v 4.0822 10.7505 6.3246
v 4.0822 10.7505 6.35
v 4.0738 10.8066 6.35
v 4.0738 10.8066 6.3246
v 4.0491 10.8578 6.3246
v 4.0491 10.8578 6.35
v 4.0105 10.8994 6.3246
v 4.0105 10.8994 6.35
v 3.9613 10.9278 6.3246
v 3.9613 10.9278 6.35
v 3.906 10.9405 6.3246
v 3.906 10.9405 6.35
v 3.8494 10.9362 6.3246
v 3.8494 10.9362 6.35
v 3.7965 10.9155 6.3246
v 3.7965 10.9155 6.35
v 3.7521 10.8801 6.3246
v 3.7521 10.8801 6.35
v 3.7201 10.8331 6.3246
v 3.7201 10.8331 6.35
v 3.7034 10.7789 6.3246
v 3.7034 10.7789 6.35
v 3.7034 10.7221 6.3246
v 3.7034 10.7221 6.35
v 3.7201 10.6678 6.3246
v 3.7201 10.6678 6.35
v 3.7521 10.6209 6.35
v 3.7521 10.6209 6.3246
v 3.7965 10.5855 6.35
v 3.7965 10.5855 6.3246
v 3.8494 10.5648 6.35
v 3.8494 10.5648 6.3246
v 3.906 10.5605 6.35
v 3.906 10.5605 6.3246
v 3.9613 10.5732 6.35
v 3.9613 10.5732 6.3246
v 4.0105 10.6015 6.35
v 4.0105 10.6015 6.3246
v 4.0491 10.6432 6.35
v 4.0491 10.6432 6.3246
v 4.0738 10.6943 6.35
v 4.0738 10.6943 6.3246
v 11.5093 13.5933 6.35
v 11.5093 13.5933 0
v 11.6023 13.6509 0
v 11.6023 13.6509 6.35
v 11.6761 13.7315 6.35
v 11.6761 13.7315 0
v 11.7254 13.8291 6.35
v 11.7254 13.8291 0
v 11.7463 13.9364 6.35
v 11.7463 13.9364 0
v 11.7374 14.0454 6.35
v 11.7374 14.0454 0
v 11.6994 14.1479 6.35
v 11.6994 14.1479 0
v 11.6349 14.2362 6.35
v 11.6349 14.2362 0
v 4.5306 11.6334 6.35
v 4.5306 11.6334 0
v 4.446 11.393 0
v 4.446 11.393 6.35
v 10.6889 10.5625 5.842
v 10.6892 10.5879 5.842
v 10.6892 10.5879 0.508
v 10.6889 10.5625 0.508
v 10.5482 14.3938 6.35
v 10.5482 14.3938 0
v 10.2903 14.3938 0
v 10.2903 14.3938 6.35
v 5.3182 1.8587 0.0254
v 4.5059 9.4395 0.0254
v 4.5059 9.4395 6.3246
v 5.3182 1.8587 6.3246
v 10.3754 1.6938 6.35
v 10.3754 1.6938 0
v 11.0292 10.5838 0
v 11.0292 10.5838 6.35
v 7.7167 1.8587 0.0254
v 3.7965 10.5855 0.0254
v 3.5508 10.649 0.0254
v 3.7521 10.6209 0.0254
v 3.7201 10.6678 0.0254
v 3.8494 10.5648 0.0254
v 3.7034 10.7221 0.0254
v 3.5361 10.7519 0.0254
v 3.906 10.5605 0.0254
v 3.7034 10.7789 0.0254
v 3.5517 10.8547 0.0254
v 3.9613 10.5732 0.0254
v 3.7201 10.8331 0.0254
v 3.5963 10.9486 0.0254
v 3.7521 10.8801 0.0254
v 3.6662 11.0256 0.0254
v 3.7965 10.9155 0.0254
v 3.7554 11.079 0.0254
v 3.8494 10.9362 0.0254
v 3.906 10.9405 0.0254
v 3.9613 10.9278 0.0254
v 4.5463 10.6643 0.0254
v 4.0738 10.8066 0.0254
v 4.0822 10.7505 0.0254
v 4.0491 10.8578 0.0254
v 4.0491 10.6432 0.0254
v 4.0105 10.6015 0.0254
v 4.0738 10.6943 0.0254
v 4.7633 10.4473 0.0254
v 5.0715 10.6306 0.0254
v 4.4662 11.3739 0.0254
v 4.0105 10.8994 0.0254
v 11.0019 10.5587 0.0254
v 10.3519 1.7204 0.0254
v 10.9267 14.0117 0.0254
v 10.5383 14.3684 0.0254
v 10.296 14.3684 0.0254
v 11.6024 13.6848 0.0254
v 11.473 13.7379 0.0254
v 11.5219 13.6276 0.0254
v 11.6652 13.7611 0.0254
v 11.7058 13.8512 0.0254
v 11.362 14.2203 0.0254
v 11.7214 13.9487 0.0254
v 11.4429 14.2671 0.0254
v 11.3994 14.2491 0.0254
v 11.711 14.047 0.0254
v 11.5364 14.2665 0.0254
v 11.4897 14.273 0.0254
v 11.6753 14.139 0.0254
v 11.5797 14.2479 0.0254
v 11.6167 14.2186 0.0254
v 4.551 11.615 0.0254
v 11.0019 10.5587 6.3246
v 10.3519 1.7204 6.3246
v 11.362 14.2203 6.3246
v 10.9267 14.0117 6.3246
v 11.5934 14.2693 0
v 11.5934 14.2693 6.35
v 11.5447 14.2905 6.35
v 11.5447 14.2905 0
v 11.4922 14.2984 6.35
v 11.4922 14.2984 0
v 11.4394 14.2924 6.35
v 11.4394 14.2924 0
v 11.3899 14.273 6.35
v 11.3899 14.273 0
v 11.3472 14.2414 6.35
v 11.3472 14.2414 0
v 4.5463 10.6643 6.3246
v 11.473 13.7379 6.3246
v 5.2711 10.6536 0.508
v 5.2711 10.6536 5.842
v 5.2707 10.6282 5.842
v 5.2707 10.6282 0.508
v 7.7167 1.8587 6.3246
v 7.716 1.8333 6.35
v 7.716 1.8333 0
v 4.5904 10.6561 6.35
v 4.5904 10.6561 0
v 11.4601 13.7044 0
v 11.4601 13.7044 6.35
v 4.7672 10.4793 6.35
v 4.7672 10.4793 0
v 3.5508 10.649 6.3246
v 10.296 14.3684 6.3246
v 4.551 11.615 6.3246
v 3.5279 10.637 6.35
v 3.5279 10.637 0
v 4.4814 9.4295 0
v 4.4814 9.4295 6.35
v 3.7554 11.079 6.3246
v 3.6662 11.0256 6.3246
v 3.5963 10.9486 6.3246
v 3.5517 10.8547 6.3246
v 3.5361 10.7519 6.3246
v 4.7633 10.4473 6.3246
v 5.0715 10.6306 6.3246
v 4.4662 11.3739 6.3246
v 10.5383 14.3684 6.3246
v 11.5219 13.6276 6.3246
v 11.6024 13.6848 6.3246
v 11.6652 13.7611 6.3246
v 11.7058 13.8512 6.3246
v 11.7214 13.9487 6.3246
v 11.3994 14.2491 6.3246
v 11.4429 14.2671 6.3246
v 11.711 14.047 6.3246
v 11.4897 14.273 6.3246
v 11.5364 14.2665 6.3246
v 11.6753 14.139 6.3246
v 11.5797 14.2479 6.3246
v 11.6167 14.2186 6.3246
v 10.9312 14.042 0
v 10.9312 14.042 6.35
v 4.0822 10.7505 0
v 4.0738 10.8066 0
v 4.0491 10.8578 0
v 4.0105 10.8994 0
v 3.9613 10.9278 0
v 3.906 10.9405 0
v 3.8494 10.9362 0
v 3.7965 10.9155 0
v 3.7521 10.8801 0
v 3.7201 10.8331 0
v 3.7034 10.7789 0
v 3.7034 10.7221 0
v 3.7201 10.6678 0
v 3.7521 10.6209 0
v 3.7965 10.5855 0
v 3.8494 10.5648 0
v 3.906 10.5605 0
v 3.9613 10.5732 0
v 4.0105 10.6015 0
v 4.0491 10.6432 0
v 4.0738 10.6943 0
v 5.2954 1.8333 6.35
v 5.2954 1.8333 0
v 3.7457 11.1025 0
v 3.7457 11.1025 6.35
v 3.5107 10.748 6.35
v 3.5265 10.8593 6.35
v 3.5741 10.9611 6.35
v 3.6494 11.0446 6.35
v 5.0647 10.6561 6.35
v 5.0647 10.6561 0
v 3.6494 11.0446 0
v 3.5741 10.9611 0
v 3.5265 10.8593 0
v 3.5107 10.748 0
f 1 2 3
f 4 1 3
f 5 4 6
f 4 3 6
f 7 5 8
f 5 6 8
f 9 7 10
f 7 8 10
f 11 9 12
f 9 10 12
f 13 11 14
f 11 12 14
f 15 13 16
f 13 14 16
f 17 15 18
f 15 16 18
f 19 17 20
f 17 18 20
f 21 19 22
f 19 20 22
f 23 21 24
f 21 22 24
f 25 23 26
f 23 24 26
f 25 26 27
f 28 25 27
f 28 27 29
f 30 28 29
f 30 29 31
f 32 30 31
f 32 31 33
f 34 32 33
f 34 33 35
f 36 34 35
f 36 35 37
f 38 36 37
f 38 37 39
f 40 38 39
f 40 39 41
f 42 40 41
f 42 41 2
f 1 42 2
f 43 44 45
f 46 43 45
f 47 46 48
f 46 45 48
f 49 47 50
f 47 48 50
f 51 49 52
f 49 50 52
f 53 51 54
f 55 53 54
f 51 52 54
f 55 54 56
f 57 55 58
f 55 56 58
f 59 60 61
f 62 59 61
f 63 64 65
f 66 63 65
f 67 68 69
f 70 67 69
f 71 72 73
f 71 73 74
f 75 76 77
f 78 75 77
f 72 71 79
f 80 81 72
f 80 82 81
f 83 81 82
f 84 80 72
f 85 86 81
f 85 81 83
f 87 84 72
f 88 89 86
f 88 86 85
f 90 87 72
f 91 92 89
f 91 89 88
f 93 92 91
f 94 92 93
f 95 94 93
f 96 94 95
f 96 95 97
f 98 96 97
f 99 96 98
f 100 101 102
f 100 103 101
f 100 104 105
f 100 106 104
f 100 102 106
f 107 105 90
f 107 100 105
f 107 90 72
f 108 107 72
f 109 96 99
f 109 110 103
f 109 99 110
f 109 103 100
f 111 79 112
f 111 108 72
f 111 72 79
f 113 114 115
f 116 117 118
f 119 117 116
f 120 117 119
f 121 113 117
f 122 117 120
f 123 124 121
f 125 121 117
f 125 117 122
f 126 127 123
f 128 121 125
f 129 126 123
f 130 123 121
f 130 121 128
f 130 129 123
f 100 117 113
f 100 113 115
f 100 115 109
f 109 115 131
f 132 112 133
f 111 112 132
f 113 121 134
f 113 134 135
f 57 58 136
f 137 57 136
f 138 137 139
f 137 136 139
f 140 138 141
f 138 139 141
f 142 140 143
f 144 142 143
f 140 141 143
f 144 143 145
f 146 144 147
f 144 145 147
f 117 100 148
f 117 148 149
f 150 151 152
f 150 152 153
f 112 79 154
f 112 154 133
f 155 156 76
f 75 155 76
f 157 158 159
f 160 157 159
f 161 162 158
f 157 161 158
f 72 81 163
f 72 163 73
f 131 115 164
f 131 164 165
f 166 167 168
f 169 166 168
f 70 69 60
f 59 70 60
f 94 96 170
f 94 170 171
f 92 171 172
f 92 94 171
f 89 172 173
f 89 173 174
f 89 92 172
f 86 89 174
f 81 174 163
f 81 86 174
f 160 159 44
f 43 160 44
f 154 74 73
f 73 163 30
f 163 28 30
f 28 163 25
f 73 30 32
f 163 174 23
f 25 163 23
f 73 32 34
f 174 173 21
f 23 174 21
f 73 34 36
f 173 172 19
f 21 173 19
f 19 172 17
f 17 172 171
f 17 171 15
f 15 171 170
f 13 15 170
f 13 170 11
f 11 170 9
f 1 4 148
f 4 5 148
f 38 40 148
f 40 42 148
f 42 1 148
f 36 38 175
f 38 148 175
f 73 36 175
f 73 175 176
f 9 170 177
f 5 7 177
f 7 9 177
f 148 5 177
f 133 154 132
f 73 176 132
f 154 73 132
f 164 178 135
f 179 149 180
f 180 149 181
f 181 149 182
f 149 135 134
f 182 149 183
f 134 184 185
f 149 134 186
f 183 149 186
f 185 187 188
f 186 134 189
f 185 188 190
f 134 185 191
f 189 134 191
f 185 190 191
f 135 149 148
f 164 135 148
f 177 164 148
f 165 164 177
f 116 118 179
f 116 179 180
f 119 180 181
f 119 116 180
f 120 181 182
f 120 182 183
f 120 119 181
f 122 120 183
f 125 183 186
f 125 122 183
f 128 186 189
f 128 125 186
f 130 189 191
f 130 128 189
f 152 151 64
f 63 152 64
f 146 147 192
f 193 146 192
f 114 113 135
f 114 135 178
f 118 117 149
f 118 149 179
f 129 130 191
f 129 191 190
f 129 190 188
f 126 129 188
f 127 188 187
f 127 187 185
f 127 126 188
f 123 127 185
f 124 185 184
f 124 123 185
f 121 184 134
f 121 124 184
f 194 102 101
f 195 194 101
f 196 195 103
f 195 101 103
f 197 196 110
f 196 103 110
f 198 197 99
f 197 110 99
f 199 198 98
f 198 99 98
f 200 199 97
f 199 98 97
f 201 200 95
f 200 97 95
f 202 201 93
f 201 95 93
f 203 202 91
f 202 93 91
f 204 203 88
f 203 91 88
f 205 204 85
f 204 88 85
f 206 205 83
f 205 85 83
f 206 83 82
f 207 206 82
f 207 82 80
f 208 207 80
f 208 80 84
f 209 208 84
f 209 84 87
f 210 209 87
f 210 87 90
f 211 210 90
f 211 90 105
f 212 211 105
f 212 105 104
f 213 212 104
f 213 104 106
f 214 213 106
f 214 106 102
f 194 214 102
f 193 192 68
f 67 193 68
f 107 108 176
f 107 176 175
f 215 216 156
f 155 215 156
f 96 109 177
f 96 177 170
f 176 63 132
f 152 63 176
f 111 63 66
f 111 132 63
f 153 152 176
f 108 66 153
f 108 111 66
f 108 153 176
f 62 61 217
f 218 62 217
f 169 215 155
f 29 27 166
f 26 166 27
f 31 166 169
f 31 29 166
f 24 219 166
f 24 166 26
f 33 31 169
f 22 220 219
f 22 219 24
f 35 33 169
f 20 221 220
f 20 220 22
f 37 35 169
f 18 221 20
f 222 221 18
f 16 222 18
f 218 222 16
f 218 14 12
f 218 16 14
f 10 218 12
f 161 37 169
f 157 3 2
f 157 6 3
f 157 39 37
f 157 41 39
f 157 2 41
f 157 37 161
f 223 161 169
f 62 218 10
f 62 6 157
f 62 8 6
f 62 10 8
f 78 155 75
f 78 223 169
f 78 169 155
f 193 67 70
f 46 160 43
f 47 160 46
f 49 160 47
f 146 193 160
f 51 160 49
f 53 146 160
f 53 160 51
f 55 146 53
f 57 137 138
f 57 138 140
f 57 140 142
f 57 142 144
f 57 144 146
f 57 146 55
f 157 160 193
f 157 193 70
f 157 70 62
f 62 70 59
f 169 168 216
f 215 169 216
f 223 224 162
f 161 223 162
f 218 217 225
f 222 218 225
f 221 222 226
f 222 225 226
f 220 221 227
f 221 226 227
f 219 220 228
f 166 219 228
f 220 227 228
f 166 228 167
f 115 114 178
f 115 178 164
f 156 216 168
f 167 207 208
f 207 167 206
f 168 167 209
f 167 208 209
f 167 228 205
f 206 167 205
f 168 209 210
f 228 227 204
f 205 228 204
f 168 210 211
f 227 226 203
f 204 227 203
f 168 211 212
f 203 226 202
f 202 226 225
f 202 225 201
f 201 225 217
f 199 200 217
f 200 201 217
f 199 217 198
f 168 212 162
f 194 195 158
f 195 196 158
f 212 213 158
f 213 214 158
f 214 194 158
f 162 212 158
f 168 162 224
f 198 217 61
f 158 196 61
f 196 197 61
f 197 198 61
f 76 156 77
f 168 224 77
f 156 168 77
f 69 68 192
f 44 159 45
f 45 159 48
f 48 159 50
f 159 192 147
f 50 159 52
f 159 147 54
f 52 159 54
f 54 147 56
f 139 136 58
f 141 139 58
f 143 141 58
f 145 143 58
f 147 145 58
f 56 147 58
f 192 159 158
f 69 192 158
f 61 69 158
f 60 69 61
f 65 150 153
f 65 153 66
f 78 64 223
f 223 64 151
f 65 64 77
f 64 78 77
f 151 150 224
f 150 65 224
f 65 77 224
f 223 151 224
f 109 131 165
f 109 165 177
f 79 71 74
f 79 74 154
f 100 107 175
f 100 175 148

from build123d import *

# Parameters (mm, degrees)
BOSS_EXTRUDE1_DEPTH = 6.35
SHELL1_START        = 0.0254
SHELL1_DEPTH        = 6.2992
SKETCH3_W           = 5.418512696
SKETCH3_H           = 5.334
CUT_EXTRUDE2_DEPTH  = 1.524
SKETCH4_R           = 0.1905
CUT_EXTRUDE3_DEPTH  = 20.633989303


# Read off the part's stored shape, not the designer's step: Shell1
with BuildPart() as part:
    # Sketch1 → Boss-Extrude1 (new body)
    with BuildSketch(Plane.XY):
        with BuildLine():
            Line((7.716040042, 1.833305163), (10.375382868, 1.693751976))
            Line((10.375382868, 1.693751976), (11.029172055, 10.583751976))
            Line((11.029172055, 10.583751976), (5.064666493, 10.656097731))
            Line((5.064666493, 10.656097731), (4.767245057, 10.479252552))
            Line((4.767245057, 10.479252552), (4.590399878, 10.656097731))
            Line((4.590399878, 10.656097731), (11.46006589, 13.704368441))
            Line((11.46006589, 13.704368441), (11.509343406, 13.593315288))
            ThreePointArc((11.509343406, 13.593315288), (11.739536715, 13.882052013), (11.634947175, 14.236197299))
            ThreePointArc((11.634947175, 14.236197299), (11.492158572, 14.298396741), (11.347210136, 14.241411598))
            Line((11.347210136, 14.241411598), (10.931187512, 14.042030874))
            Line((10.931187512, 14.042030874), (10.548202312, 14.393751976))
            Line((10.548202312, 14.393751976), (10.290273504, 14.393751976))
            Line((10.290273504, 14.393751976), (4.530564215, 11.633385245))
            Line((4.530564215, 11.633385245), (4.445957531, 11.39304745))
            Line((4.445957531, 11.39304745), (3.74568803, 11.102479142))
            ThreePointArc((3.74568803, 11.102479142), (3.54655055, 10.911956466), (3.527947792, 10.636986353))
            Line((3.527947792, 10.636986353), (4.481389231, 9.429510304))
            Line((4.481389231, 9.429510304), (5.295382868, 1.833305163))
            Line((5.295382868, 1.833305163), (7.716040042, 1.833305163))
        make_face()
    extrude(amount=BOSS_EXTRUDE1_DEPTH)

    # Shell1 outline → Shell1 (cut)
    with BuildSketch(Plane.XY.offset(SHELL1_START)):
        with BuildLine():
            Line((5.318206472, 1.858705163), (7.716706036, 1.858705163))
            Line((7.716706036, 1.858705163), (10.351875533, 1.720420509))
            Line((10.351875533, 1.720420509), (11.001859717, 10.558681389))
            Line((11.001859717, 10.558681389), (5.071504797, 10.630612918))
            Line((5.071504797, 10.630612918), (4.76325019, 10.447326395))
            Line((4.76325019, 10.447326395), (4.546271575, 10.664305009))
            Line((4.546271575, 10.664305009), (11.472980817, 13.737887461))
            Line((11.472980817, 13.737887461), (11.521908422, 13.627622875))
            ThreePointArc((11.521908422, 13.627622875), (11.716832945, 13.899435369), (11.616664188, 14.218565158))
            ThreePointArc((11.616664188, 14.218565158), (11.489713166, 14.273025818), (11.362015112, 14.220340596))
            Line((11.362015112, 14.220340596), (10.926665769, 14.011697454))
            Line((10.926665769, 14.011697454), (10.538308623, 14.368351976))
            Line((10.538308623, 14.368351976), (10.296045707, 14.368351976))
            Line((10.296045707, 14.368351976), (4.551029407, 11.615026927))
            Line((4.551029407, 11.615026927), (4.466154882, 11.373928288))
            Line((4.466154882, 11.373928288), (3.755422691, 11.079018614))
            ThreePointArc((3.755422691, 11.079018614), (3.570543876, 10.903284548), (3.550847191, 10.64897238))
            Line((3.550847191, 10.64897238), (4.505864047, 9.439501161))
            Line((4.505864047, 9.439501161), (5.318206472, 1.858705163))
        make_face()
    extrude(amount=SHELL1_DEPTH, mode=Mode.SUBTRACT)

    # Sketch3 → Cut-Extrude2 (cut)
    with BuildSketch(Plane(origin=(0.12997786, 10.715952445, 0), x_dir=(0.9999264471855748, -0.012128487903857954, 0), z_dir=(0.012128487903857952, 0.9999264471855747, 0))):
        with Locations((7.850713163, -3.175)):
            Rectangle(SKETCH3_W, SKETCH3_H)
    extrude(amount=-CUT_EXTRUDE2_DEPTH, mode=Mode.SUBTRACT)

    # Sketch4 → Cut-Extrude3 (cut, through all)
    with BuildSketch(Plane.XY.offset(6.35)):
        with Locations((3.89174221, 10.750488628)):
            Circle(SKETCH4_R)
    extrude(amount=-CUT_EXTRUDE3_DEPTH, mode=Mode.SUBTRACT)


solid = part.part
